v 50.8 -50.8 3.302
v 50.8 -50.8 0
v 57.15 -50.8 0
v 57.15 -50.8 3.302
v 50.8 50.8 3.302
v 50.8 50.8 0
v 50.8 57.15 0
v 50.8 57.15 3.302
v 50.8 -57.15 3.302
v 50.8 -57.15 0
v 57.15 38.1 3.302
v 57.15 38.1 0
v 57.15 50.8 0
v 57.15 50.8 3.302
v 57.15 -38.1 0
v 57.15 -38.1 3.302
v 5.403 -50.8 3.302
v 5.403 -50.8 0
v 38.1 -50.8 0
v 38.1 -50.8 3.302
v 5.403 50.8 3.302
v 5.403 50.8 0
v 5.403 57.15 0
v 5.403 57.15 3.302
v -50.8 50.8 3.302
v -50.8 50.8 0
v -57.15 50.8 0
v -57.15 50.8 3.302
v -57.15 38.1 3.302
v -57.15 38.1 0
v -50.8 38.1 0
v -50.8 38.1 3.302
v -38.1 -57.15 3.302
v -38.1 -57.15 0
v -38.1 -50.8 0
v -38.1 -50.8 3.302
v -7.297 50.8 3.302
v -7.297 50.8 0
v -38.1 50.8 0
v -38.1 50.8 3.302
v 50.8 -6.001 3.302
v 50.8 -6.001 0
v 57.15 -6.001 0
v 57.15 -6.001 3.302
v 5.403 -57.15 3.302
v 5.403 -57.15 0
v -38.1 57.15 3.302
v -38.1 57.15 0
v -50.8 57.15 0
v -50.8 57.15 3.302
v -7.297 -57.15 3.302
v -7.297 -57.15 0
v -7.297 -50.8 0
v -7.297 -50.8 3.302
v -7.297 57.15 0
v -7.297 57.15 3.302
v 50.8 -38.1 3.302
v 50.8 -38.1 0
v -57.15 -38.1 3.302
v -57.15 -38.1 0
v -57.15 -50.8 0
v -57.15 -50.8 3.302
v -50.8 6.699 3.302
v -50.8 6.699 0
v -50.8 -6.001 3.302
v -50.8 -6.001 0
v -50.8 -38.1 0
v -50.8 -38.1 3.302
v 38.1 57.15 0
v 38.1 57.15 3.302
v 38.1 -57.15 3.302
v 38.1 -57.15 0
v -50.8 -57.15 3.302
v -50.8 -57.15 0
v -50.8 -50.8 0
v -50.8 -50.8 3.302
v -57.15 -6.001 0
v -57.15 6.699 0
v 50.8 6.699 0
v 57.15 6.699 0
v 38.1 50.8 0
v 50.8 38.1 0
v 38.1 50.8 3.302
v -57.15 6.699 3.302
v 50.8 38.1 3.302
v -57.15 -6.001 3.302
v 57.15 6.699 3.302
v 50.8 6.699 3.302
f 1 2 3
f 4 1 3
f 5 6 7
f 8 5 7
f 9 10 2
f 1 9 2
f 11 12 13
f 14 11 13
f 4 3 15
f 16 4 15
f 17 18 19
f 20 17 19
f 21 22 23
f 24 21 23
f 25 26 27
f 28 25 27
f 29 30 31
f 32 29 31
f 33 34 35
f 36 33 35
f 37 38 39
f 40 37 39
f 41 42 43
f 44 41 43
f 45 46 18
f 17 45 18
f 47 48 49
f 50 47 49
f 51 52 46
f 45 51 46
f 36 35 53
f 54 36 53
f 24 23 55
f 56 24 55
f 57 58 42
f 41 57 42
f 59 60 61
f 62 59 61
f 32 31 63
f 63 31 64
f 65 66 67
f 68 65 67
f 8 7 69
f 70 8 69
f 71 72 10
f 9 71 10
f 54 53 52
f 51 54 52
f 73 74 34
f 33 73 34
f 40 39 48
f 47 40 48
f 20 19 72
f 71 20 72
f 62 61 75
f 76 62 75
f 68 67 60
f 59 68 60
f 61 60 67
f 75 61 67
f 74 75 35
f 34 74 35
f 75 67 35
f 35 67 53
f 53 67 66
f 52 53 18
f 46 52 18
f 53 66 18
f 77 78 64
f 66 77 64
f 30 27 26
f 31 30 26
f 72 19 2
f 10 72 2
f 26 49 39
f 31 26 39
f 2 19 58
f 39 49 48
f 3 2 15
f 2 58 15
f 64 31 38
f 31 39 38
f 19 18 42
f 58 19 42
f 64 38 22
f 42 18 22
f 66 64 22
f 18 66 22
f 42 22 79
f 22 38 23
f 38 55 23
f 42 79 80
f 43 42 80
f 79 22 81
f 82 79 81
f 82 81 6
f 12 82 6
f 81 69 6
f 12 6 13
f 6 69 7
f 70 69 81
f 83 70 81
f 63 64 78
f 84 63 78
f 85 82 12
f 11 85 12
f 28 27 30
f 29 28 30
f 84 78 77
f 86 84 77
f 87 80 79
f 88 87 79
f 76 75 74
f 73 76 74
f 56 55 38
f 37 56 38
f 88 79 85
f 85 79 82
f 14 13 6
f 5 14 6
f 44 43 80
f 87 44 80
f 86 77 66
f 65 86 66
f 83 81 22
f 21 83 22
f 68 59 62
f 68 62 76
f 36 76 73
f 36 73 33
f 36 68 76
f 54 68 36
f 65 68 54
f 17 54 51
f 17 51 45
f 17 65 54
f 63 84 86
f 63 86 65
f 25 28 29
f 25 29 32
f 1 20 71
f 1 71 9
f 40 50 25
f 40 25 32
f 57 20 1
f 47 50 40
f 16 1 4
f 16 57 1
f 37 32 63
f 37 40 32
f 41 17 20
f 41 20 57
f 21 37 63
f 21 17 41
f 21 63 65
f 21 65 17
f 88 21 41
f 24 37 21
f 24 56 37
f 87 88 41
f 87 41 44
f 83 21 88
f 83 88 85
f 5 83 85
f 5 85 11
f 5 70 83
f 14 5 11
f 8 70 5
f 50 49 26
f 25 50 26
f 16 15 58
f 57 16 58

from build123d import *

# Parameters (mm, degrees)
F1_DEPTH = 3.302


with BuildPart() as f1:
    # F0 (on Top) → F1 (new body)
    with BuildSketch(Plane.XY):
        Polygon((-7.29726, 50.8), (-38.1, 50.8), (-38.1, 57.15), (-50.8, 57.15), (-50.8, 50.8), (-57.15, 50.8), (-57.15, 38.1), (-50.8, 38.1), (-50.8, 6.698998), (-57.15, 6.698998), (-57.15, -6.001002), (-50.8, -6.001002), (-50.8, -38.1), (-57.15, -38.1), (-57.15, -50.8), (-50.8, -50.8), (-50.8, -57.15), (-38.1, -57.15), (-38.1, -50.8), (-7.29726, -50.8), (-7.29726, -57.15), (5.40274, -57.15), (5.40274, -50.8), (38.1, -50.8), (38.1, -57.15), (50.8, -57.15), (50.8, -50.8), (57.15, -50.8), (57.15, -38.1), (50.8, -38.1), (50.8, -6.001002), (57.15, -6.001002), (57.15, 6.698998), (50.8, 6.698998), (50.8, 38.1), (57.15, 38.1), (57.15, 50.8), (50.8, 50.8), (50.8, 57.15), (38.1, 57.15), (38.1, 50.8), (5.40274, 50.8), (5.40274, 57.15), (-7.29726, 57.15), align=None)
    extrude(amount=F1_DEPTH)


solid = f1.part
